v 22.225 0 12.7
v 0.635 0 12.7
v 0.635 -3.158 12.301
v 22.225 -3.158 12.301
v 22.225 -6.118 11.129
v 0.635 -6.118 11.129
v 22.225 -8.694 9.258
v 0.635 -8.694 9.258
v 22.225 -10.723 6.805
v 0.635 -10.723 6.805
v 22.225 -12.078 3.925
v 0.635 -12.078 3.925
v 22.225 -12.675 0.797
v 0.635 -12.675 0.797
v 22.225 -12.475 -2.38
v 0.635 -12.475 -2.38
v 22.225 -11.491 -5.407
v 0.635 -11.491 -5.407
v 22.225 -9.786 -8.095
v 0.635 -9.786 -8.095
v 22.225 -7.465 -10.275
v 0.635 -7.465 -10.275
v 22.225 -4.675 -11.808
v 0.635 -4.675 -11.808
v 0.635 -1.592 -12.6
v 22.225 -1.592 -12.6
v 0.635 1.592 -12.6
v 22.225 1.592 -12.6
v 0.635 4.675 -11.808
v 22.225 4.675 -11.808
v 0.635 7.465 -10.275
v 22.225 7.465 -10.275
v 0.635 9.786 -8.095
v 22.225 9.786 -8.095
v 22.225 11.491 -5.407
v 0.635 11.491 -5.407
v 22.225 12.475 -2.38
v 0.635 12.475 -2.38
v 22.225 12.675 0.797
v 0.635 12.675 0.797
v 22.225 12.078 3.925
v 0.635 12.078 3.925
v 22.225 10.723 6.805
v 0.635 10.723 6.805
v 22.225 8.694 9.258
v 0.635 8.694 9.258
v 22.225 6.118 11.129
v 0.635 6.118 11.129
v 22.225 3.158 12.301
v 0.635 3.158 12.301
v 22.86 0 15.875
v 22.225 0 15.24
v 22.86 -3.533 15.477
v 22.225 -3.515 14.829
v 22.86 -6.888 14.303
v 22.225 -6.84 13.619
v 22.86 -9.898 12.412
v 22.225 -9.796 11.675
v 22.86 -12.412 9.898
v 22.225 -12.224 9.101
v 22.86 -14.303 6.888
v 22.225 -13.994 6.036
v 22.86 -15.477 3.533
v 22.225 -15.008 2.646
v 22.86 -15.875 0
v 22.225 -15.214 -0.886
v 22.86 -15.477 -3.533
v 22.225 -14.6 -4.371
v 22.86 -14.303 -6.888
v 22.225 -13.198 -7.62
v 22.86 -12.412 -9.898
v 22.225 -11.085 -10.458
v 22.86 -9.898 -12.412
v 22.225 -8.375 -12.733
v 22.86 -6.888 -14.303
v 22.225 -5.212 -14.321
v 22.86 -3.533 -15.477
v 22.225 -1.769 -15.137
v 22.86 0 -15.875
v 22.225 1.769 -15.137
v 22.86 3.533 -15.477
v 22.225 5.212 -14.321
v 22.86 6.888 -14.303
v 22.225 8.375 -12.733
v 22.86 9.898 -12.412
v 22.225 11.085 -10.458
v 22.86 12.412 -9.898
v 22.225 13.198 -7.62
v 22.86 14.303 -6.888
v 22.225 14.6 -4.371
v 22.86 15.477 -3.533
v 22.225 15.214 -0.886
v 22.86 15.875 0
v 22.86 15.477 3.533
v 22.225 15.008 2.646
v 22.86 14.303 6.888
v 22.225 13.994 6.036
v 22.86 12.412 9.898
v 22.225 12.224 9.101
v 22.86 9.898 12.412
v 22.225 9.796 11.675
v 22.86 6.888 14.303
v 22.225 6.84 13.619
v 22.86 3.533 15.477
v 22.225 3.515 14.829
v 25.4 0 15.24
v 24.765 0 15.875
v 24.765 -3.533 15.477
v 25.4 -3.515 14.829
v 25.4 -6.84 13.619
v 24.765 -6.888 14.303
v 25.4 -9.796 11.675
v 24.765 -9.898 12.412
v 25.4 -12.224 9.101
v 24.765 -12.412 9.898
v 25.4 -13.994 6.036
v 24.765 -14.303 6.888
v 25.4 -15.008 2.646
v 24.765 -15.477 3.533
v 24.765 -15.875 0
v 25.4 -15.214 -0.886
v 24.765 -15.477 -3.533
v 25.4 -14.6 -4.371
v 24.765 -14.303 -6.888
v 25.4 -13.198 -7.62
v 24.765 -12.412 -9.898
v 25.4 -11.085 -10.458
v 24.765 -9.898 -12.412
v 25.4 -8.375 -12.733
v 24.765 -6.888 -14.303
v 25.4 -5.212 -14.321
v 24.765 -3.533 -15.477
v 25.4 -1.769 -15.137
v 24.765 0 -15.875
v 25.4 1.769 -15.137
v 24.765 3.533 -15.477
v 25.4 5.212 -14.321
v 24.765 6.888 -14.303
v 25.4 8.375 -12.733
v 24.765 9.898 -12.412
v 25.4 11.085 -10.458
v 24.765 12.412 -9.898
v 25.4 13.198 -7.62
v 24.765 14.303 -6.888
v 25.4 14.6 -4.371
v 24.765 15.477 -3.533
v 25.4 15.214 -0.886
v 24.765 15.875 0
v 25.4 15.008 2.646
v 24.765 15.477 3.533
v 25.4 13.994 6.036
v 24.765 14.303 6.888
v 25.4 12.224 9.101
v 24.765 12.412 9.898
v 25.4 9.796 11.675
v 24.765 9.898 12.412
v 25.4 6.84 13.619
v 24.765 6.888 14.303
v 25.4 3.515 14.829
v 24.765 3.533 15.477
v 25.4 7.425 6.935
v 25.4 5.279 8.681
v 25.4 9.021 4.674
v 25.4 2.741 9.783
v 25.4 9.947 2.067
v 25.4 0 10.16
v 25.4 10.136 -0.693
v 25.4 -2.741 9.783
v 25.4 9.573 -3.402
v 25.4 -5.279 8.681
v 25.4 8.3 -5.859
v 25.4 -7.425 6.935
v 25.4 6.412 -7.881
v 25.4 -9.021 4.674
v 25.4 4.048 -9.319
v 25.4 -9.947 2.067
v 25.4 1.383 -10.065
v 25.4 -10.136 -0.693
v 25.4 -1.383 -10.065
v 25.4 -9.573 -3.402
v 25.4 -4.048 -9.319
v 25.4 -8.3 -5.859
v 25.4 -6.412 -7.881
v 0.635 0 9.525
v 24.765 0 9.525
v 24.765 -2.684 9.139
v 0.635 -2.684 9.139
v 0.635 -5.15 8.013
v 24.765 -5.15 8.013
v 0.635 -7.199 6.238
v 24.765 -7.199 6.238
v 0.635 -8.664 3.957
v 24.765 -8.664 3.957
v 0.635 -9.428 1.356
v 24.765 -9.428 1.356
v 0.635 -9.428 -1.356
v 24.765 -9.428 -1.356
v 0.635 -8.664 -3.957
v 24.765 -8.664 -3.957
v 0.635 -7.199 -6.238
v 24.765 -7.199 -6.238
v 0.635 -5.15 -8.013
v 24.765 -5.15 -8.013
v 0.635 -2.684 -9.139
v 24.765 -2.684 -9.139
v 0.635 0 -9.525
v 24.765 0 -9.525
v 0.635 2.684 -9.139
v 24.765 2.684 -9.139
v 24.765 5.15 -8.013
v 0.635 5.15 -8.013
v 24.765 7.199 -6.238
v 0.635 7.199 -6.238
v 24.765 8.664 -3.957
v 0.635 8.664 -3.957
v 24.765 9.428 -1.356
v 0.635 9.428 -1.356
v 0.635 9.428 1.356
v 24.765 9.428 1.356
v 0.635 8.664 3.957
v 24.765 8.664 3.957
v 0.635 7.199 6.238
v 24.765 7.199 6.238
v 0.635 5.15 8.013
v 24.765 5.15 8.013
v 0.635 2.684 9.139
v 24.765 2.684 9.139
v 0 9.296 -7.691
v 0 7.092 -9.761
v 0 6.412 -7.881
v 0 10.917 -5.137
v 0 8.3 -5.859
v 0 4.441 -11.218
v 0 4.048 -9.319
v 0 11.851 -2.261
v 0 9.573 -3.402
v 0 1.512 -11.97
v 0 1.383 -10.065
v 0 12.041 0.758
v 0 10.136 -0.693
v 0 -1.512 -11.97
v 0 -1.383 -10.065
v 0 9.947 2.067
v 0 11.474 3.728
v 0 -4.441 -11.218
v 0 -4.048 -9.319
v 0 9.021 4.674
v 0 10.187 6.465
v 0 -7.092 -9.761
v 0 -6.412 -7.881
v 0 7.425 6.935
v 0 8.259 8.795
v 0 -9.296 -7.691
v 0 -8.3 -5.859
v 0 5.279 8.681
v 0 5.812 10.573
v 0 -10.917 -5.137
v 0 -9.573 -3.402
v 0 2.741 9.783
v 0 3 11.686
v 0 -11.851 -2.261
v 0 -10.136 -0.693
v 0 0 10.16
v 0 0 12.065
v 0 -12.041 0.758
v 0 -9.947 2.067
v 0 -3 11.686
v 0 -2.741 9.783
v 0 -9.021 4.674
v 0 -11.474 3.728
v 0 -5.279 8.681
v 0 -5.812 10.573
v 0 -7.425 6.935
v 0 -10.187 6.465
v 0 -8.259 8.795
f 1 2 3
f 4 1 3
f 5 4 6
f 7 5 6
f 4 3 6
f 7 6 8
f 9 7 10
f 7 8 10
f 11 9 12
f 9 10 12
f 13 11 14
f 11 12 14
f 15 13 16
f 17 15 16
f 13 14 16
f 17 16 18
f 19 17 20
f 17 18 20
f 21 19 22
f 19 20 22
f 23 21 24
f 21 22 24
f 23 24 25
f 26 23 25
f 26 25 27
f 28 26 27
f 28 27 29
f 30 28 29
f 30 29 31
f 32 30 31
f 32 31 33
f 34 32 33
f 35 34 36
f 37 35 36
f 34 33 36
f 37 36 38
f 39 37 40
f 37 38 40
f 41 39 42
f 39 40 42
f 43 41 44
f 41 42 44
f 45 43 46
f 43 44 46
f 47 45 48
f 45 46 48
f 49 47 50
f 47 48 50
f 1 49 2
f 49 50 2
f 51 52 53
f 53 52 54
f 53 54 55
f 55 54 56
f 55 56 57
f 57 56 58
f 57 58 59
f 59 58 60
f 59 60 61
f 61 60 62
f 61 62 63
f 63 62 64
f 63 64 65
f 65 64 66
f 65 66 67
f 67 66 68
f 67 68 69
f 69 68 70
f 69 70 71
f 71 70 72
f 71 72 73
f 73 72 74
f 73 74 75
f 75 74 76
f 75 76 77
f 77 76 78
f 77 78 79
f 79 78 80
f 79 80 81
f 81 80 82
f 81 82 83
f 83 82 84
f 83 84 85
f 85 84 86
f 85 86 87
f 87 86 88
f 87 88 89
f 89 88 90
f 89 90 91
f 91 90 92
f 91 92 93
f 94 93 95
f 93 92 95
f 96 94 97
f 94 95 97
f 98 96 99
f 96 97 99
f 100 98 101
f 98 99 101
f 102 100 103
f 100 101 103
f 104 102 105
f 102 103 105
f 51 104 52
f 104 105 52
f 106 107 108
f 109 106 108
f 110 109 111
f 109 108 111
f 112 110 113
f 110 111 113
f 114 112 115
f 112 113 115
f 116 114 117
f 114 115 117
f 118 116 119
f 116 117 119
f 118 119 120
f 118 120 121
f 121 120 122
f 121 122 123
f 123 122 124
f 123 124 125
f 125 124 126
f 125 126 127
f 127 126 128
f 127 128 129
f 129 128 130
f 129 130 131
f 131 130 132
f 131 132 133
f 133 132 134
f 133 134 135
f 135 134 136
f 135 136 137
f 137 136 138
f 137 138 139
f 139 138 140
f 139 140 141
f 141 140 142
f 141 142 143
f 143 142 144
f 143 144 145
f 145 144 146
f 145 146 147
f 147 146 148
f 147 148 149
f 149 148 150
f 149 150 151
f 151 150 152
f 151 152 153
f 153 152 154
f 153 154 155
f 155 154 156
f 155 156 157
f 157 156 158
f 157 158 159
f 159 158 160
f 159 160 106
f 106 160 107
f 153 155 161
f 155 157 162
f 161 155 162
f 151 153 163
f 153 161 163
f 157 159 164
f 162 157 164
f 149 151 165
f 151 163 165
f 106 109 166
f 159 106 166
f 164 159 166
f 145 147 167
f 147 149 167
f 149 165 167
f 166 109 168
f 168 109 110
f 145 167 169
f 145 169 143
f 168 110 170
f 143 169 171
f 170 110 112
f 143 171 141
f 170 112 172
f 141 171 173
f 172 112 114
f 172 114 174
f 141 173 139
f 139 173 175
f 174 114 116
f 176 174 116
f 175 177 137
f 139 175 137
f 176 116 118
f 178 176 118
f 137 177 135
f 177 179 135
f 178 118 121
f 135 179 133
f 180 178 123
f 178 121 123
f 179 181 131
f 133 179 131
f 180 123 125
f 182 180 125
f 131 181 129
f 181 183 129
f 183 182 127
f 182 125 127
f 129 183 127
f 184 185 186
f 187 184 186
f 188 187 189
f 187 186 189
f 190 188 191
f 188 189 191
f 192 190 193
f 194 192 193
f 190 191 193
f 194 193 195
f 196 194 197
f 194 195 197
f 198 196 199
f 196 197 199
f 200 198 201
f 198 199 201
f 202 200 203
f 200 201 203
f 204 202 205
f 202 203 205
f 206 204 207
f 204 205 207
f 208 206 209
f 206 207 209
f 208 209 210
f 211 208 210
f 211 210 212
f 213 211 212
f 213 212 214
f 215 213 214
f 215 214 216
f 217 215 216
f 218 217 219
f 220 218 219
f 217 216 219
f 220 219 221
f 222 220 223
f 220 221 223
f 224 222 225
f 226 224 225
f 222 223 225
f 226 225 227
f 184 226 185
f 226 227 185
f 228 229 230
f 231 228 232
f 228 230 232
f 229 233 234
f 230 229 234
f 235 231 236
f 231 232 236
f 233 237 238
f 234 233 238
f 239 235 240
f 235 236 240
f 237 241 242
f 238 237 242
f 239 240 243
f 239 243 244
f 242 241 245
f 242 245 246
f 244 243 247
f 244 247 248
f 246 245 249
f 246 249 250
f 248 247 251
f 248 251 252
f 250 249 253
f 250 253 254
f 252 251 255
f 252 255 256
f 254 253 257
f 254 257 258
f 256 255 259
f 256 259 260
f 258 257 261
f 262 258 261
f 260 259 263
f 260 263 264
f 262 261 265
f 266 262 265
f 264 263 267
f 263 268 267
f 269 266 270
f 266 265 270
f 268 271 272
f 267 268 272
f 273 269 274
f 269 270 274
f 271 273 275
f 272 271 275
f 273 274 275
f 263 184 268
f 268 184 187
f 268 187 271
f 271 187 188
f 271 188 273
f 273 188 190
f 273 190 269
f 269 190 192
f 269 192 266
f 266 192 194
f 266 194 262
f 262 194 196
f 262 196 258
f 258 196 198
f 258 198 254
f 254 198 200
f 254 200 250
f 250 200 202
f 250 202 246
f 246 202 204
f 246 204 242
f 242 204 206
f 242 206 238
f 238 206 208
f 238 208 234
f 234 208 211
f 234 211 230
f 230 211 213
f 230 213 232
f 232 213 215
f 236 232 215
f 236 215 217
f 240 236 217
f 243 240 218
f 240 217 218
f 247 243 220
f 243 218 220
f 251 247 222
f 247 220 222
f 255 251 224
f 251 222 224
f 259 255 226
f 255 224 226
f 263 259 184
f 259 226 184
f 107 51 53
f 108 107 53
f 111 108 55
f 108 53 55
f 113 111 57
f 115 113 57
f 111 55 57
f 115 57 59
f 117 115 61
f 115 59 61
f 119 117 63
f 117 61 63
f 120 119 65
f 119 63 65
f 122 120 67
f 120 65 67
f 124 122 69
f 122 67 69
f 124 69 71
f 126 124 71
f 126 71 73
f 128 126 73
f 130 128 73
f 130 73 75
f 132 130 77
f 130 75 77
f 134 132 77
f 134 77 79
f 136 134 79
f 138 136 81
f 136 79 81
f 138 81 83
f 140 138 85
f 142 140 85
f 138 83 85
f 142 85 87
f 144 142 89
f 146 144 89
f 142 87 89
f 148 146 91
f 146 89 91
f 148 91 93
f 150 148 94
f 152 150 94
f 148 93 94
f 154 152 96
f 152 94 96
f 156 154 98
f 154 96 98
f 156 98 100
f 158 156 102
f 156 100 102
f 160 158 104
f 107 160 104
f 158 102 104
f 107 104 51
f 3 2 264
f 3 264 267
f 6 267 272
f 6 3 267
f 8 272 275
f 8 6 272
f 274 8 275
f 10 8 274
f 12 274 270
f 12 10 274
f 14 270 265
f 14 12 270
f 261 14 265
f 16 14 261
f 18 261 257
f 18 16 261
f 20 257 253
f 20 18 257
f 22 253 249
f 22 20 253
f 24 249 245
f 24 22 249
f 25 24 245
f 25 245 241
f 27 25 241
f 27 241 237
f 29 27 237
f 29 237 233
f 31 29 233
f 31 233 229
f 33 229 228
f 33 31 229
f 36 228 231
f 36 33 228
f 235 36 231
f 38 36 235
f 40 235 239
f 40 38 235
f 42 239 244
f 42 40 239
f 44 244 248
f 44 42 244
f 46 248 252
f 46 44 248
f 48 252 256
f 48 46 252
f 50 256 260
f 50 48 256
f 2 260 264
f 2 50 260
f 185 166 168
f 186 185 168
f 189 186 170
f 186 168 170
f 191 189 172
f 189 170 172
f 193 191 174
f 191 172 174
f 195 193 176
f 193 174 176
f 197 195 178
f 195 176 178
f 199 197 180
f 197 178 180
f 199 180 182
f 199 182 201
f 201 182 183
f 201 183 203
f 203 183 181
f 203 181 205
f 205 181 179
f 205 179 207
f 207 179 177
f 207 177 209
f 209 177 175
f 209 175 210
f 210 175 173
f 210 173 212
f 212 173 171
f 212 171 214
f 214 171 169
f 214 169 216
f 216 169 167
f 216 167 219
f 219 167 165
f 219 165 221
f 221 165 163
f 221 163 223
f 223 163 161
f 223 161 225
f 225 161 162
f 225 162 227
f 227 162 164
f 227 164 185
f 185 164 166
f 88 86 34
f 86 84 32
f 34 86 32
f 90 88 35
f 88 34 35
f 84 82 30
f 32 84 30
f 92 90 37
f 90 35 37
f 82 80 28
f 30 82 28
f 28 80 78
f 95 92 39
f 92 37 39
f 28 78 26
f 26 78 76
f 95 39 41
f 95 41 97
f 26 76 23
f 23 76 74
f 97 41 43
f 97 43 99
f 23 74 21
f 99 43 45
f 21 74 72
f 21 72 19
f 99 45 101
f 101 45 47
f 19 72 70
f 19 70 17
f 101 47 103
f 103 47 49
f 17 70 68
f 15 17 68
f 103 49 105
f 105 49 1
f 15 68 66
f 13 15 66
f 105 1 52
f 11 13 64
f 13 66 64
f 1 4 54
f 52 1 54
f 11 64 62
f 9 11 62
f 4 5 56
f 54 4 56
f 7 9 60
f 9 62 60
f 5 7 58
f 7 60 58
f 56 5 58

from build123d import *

# Parameters (mm, degrees)
F2_SIZE = 0.635


with BuildPart() as f1:
    # F0 (on Front) → F1 (revolve)
    with BuildSketch(Plane.XZ):
        Polygon((0, 12.7), (0, 9.525), (25.4, 9.525), (25.4, 15.875), (22.225, 15.875), (22.225, 12.7), align=None)
    revolve(axis=Axis((10.366244, 0, 0), (1, 0, 0)))

    # F2
    f2_edges = [f1.edges().sort_by_distance(p)[0] for p in [
        (25.4, 0, -15.875),
        (0, 0, -12.7),
        (22.225, 0, -15.875),
        (25.4, 0, -9.525),
        (0, 0, -9.525),
    ]]
    chamfer(f2_edges, length=F2_SIZE)


solid = f1.part
